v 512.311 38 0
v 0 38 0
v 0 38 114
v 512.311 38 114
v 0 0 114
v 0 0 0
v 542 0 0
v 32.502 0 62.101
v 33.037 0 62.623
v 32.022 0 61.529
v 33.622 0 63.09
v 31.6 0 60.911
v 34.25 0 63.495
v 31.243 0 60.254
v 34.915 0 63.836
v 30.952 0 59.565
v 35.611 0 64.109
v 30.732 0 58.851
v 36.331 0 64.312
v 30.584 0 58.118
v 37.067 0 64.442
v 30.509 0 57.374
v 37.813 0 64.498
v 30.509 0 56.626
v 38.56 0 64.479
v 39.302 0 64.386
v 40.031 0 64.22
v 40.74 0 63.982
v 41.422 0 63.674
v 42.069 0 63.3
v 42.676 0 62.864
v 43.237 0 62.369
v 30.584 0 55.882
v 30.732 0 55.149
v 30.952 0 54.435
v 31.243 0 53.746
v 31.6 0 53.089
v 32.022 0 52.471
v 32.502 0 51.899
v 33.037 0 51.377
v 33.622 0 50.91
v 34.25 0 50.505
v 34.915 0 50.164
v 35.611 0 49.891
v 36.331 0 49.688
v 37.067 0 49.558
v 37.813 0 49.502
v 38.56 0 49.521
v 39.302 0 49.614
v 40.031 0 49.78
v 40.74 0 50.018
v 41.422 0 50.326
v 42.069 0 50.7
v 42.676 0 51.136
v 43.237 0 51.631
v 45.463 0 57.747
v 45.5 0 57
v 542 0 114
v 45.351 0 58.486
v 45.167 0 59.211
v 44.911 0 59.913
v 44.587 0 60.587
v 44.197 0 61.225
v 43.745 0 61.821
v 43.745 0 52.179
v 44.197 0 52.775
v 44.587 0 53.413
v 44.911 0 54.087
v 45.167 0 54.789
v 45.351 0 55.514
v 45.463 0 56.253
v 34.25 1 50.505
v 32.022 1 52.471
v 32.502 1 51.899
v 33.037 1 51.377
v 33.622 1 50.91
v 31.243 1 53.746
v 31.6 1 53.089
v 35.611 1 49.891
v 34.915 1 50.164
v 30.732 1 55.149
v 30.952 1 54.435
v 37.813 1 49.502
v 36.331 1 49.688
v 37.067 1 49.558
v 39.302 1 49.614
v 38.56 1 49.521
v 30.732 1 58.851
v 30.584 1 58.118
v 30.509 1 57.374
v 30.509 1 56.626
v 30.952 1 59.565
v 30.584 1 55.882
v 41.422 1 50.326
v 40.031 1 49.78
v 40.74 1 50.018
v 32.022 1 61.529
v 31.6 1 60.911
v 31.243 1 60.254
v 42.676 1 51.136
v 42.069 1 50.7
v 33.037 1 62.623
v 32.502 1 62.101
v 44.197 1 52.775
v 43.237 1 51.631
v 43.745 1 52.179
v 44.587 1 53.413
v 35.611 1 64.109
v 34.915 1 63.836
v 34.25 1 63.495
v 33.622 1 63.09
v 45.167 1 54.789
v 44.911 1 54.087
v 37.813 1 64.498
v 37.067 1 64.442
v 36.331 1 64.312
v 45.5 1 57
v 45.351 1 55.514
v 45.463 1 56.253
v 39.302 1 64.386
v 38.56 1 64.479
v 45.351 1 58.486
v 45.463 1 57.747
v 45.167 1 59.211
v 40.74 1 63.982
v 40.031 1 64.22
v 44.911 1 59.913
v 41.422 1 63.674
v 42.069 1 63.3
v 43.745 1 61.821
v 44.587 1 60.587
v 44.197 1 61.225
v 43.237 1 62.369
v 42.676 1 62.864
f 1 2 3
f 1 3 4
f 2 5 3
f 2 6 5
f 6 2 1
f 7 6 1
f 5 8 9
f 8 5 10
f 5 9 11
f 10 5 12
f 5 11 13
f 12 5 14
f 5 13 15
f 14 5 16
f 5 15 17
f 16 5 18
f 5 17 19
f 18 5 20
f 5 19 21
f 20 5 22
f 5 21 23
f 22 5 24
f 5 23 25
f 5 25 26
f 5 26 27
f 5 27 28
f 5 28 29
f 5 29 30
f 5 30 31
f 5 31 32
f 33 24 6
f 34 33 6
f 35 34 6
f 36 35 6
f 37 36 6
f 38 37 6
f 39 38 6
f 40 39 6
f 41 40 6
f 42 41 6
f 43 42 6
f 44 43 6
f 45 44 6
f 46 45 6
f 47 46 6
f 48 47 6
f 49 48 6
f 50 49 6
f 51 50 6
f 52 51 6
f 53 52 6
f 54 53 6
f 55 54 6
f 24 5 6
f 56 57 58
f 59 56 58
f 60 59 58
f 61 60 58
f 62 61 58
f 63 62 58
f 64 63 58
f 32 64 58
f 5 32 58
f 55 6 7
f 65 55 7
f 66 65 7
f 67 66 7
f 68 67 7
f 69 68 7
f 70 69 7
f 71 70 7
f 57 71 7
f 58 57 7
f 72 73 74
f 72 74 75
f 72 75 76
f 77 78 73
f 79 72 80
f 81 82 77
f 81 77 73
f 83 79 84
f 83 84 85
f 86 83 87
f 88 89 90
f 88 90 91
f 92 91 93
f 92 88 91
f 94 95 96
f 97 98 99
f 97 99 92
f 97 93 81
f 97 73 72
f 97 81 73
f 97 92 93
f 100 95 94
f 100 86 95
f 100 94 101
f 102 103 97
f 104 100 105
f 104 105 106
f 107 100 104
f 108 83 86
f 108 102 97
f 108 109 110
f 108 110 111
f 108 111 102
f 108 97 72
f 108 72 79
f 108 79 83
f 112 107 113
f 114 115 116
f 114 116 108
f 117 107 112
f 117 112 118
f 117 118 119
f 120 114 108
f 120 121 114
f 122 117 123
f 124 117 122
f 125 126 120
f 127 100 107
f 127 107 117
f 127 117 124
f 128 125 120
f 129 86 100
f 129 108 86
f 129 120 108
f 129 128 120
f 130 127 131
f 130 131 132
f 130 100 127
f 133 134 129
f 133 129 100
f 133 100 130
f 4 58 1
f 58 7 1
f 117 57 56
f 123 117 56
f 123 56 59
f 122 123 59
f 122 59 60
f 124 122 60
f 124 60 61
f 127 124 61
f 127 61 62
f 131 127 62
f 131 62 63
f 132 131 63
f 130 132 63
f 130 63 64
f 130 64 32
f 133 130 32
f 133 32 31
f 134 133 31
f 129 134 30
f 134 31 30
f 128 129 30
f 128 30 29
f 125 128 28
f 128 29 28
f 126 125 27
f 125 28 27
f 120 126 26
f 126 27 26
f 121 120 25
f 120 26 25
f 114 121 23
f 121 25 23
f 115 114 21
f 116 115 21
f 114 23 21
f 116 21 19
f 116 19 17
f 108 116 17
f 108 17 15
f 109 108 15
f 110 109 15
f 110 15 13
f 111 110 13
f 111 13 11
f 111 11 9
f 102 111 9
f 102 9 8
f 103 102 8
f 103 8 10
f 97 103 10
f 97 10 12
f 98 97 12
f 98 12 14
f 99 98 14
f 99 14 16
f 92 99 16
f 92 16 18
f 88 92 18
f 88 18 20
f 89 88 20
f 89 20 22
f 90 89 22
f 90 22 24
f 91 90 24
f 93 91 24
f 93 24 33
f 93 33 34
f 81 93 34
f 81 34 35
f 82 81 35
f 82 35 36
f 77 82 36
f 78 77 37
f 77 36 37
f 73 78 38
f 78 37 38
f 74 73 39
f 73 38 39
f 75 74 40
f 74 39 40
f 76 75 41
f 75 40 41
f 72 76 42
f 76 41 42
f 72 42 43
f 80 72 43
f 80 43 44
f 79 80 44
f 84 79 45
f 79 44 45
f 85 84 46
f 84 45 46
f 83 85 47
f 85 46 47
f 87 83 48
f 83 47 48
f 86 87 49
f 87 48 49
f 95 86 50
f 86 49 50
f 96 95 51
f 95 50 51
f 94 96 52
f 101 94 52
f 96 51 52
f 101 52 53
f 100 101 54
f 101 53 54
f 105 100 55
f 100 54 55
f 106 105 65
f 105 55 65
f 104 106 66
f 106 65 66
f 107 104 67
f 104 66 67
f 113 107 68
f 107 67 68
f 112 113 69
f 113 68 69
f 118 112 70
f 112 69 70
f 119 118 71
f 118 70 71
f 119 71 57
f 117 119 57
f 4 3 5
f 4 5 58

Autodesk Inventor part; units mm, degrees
ref_plane "YZ Plane" through (0, 0, 0) normal (1, 0, 0) x (0, 1, 0)
ref_plane "XZ Plane" through (0, 0, 0) normal (0, 1, 0) x (-1, 0, 0)
ref_plane "XY Plane" through (0, 0, 0) normal (0, 0, 1) x (1, 0, 0)
sketch "Sketch1" plane through (0, 0, 0) normal (0, 0, 1) x (1, 0, 0)
  line L0 (0, 0) -> (542, 0)
  line L1 (0, 0) -> (0, 38)
  line L2 (0, 38) -> (512.3111, 38)
  line L3 (542, 0) -> (512.3111, 38)
  dimension "d0" = 542
  dimension "d1" = 38
  dimension "d2" = 52
extrude "Extrusion1" add sketch "Sketch1" along normal blind 114
sketch "Sketch3" plane through (0, 0, 0) normal (0, -1, 0) x (1, 0, 0)
  line L0 (0, 0) -> (0, 114) projected
  circle A0 centre (38, 57) radius 7.5
  dimension "d21" = 38
  dimension "d22" = 15
extrude "Extrusion2" cut sketch "Sketch3" against normal blind 1
properties part number "2p3s37" material "Wood (Cherry)"
